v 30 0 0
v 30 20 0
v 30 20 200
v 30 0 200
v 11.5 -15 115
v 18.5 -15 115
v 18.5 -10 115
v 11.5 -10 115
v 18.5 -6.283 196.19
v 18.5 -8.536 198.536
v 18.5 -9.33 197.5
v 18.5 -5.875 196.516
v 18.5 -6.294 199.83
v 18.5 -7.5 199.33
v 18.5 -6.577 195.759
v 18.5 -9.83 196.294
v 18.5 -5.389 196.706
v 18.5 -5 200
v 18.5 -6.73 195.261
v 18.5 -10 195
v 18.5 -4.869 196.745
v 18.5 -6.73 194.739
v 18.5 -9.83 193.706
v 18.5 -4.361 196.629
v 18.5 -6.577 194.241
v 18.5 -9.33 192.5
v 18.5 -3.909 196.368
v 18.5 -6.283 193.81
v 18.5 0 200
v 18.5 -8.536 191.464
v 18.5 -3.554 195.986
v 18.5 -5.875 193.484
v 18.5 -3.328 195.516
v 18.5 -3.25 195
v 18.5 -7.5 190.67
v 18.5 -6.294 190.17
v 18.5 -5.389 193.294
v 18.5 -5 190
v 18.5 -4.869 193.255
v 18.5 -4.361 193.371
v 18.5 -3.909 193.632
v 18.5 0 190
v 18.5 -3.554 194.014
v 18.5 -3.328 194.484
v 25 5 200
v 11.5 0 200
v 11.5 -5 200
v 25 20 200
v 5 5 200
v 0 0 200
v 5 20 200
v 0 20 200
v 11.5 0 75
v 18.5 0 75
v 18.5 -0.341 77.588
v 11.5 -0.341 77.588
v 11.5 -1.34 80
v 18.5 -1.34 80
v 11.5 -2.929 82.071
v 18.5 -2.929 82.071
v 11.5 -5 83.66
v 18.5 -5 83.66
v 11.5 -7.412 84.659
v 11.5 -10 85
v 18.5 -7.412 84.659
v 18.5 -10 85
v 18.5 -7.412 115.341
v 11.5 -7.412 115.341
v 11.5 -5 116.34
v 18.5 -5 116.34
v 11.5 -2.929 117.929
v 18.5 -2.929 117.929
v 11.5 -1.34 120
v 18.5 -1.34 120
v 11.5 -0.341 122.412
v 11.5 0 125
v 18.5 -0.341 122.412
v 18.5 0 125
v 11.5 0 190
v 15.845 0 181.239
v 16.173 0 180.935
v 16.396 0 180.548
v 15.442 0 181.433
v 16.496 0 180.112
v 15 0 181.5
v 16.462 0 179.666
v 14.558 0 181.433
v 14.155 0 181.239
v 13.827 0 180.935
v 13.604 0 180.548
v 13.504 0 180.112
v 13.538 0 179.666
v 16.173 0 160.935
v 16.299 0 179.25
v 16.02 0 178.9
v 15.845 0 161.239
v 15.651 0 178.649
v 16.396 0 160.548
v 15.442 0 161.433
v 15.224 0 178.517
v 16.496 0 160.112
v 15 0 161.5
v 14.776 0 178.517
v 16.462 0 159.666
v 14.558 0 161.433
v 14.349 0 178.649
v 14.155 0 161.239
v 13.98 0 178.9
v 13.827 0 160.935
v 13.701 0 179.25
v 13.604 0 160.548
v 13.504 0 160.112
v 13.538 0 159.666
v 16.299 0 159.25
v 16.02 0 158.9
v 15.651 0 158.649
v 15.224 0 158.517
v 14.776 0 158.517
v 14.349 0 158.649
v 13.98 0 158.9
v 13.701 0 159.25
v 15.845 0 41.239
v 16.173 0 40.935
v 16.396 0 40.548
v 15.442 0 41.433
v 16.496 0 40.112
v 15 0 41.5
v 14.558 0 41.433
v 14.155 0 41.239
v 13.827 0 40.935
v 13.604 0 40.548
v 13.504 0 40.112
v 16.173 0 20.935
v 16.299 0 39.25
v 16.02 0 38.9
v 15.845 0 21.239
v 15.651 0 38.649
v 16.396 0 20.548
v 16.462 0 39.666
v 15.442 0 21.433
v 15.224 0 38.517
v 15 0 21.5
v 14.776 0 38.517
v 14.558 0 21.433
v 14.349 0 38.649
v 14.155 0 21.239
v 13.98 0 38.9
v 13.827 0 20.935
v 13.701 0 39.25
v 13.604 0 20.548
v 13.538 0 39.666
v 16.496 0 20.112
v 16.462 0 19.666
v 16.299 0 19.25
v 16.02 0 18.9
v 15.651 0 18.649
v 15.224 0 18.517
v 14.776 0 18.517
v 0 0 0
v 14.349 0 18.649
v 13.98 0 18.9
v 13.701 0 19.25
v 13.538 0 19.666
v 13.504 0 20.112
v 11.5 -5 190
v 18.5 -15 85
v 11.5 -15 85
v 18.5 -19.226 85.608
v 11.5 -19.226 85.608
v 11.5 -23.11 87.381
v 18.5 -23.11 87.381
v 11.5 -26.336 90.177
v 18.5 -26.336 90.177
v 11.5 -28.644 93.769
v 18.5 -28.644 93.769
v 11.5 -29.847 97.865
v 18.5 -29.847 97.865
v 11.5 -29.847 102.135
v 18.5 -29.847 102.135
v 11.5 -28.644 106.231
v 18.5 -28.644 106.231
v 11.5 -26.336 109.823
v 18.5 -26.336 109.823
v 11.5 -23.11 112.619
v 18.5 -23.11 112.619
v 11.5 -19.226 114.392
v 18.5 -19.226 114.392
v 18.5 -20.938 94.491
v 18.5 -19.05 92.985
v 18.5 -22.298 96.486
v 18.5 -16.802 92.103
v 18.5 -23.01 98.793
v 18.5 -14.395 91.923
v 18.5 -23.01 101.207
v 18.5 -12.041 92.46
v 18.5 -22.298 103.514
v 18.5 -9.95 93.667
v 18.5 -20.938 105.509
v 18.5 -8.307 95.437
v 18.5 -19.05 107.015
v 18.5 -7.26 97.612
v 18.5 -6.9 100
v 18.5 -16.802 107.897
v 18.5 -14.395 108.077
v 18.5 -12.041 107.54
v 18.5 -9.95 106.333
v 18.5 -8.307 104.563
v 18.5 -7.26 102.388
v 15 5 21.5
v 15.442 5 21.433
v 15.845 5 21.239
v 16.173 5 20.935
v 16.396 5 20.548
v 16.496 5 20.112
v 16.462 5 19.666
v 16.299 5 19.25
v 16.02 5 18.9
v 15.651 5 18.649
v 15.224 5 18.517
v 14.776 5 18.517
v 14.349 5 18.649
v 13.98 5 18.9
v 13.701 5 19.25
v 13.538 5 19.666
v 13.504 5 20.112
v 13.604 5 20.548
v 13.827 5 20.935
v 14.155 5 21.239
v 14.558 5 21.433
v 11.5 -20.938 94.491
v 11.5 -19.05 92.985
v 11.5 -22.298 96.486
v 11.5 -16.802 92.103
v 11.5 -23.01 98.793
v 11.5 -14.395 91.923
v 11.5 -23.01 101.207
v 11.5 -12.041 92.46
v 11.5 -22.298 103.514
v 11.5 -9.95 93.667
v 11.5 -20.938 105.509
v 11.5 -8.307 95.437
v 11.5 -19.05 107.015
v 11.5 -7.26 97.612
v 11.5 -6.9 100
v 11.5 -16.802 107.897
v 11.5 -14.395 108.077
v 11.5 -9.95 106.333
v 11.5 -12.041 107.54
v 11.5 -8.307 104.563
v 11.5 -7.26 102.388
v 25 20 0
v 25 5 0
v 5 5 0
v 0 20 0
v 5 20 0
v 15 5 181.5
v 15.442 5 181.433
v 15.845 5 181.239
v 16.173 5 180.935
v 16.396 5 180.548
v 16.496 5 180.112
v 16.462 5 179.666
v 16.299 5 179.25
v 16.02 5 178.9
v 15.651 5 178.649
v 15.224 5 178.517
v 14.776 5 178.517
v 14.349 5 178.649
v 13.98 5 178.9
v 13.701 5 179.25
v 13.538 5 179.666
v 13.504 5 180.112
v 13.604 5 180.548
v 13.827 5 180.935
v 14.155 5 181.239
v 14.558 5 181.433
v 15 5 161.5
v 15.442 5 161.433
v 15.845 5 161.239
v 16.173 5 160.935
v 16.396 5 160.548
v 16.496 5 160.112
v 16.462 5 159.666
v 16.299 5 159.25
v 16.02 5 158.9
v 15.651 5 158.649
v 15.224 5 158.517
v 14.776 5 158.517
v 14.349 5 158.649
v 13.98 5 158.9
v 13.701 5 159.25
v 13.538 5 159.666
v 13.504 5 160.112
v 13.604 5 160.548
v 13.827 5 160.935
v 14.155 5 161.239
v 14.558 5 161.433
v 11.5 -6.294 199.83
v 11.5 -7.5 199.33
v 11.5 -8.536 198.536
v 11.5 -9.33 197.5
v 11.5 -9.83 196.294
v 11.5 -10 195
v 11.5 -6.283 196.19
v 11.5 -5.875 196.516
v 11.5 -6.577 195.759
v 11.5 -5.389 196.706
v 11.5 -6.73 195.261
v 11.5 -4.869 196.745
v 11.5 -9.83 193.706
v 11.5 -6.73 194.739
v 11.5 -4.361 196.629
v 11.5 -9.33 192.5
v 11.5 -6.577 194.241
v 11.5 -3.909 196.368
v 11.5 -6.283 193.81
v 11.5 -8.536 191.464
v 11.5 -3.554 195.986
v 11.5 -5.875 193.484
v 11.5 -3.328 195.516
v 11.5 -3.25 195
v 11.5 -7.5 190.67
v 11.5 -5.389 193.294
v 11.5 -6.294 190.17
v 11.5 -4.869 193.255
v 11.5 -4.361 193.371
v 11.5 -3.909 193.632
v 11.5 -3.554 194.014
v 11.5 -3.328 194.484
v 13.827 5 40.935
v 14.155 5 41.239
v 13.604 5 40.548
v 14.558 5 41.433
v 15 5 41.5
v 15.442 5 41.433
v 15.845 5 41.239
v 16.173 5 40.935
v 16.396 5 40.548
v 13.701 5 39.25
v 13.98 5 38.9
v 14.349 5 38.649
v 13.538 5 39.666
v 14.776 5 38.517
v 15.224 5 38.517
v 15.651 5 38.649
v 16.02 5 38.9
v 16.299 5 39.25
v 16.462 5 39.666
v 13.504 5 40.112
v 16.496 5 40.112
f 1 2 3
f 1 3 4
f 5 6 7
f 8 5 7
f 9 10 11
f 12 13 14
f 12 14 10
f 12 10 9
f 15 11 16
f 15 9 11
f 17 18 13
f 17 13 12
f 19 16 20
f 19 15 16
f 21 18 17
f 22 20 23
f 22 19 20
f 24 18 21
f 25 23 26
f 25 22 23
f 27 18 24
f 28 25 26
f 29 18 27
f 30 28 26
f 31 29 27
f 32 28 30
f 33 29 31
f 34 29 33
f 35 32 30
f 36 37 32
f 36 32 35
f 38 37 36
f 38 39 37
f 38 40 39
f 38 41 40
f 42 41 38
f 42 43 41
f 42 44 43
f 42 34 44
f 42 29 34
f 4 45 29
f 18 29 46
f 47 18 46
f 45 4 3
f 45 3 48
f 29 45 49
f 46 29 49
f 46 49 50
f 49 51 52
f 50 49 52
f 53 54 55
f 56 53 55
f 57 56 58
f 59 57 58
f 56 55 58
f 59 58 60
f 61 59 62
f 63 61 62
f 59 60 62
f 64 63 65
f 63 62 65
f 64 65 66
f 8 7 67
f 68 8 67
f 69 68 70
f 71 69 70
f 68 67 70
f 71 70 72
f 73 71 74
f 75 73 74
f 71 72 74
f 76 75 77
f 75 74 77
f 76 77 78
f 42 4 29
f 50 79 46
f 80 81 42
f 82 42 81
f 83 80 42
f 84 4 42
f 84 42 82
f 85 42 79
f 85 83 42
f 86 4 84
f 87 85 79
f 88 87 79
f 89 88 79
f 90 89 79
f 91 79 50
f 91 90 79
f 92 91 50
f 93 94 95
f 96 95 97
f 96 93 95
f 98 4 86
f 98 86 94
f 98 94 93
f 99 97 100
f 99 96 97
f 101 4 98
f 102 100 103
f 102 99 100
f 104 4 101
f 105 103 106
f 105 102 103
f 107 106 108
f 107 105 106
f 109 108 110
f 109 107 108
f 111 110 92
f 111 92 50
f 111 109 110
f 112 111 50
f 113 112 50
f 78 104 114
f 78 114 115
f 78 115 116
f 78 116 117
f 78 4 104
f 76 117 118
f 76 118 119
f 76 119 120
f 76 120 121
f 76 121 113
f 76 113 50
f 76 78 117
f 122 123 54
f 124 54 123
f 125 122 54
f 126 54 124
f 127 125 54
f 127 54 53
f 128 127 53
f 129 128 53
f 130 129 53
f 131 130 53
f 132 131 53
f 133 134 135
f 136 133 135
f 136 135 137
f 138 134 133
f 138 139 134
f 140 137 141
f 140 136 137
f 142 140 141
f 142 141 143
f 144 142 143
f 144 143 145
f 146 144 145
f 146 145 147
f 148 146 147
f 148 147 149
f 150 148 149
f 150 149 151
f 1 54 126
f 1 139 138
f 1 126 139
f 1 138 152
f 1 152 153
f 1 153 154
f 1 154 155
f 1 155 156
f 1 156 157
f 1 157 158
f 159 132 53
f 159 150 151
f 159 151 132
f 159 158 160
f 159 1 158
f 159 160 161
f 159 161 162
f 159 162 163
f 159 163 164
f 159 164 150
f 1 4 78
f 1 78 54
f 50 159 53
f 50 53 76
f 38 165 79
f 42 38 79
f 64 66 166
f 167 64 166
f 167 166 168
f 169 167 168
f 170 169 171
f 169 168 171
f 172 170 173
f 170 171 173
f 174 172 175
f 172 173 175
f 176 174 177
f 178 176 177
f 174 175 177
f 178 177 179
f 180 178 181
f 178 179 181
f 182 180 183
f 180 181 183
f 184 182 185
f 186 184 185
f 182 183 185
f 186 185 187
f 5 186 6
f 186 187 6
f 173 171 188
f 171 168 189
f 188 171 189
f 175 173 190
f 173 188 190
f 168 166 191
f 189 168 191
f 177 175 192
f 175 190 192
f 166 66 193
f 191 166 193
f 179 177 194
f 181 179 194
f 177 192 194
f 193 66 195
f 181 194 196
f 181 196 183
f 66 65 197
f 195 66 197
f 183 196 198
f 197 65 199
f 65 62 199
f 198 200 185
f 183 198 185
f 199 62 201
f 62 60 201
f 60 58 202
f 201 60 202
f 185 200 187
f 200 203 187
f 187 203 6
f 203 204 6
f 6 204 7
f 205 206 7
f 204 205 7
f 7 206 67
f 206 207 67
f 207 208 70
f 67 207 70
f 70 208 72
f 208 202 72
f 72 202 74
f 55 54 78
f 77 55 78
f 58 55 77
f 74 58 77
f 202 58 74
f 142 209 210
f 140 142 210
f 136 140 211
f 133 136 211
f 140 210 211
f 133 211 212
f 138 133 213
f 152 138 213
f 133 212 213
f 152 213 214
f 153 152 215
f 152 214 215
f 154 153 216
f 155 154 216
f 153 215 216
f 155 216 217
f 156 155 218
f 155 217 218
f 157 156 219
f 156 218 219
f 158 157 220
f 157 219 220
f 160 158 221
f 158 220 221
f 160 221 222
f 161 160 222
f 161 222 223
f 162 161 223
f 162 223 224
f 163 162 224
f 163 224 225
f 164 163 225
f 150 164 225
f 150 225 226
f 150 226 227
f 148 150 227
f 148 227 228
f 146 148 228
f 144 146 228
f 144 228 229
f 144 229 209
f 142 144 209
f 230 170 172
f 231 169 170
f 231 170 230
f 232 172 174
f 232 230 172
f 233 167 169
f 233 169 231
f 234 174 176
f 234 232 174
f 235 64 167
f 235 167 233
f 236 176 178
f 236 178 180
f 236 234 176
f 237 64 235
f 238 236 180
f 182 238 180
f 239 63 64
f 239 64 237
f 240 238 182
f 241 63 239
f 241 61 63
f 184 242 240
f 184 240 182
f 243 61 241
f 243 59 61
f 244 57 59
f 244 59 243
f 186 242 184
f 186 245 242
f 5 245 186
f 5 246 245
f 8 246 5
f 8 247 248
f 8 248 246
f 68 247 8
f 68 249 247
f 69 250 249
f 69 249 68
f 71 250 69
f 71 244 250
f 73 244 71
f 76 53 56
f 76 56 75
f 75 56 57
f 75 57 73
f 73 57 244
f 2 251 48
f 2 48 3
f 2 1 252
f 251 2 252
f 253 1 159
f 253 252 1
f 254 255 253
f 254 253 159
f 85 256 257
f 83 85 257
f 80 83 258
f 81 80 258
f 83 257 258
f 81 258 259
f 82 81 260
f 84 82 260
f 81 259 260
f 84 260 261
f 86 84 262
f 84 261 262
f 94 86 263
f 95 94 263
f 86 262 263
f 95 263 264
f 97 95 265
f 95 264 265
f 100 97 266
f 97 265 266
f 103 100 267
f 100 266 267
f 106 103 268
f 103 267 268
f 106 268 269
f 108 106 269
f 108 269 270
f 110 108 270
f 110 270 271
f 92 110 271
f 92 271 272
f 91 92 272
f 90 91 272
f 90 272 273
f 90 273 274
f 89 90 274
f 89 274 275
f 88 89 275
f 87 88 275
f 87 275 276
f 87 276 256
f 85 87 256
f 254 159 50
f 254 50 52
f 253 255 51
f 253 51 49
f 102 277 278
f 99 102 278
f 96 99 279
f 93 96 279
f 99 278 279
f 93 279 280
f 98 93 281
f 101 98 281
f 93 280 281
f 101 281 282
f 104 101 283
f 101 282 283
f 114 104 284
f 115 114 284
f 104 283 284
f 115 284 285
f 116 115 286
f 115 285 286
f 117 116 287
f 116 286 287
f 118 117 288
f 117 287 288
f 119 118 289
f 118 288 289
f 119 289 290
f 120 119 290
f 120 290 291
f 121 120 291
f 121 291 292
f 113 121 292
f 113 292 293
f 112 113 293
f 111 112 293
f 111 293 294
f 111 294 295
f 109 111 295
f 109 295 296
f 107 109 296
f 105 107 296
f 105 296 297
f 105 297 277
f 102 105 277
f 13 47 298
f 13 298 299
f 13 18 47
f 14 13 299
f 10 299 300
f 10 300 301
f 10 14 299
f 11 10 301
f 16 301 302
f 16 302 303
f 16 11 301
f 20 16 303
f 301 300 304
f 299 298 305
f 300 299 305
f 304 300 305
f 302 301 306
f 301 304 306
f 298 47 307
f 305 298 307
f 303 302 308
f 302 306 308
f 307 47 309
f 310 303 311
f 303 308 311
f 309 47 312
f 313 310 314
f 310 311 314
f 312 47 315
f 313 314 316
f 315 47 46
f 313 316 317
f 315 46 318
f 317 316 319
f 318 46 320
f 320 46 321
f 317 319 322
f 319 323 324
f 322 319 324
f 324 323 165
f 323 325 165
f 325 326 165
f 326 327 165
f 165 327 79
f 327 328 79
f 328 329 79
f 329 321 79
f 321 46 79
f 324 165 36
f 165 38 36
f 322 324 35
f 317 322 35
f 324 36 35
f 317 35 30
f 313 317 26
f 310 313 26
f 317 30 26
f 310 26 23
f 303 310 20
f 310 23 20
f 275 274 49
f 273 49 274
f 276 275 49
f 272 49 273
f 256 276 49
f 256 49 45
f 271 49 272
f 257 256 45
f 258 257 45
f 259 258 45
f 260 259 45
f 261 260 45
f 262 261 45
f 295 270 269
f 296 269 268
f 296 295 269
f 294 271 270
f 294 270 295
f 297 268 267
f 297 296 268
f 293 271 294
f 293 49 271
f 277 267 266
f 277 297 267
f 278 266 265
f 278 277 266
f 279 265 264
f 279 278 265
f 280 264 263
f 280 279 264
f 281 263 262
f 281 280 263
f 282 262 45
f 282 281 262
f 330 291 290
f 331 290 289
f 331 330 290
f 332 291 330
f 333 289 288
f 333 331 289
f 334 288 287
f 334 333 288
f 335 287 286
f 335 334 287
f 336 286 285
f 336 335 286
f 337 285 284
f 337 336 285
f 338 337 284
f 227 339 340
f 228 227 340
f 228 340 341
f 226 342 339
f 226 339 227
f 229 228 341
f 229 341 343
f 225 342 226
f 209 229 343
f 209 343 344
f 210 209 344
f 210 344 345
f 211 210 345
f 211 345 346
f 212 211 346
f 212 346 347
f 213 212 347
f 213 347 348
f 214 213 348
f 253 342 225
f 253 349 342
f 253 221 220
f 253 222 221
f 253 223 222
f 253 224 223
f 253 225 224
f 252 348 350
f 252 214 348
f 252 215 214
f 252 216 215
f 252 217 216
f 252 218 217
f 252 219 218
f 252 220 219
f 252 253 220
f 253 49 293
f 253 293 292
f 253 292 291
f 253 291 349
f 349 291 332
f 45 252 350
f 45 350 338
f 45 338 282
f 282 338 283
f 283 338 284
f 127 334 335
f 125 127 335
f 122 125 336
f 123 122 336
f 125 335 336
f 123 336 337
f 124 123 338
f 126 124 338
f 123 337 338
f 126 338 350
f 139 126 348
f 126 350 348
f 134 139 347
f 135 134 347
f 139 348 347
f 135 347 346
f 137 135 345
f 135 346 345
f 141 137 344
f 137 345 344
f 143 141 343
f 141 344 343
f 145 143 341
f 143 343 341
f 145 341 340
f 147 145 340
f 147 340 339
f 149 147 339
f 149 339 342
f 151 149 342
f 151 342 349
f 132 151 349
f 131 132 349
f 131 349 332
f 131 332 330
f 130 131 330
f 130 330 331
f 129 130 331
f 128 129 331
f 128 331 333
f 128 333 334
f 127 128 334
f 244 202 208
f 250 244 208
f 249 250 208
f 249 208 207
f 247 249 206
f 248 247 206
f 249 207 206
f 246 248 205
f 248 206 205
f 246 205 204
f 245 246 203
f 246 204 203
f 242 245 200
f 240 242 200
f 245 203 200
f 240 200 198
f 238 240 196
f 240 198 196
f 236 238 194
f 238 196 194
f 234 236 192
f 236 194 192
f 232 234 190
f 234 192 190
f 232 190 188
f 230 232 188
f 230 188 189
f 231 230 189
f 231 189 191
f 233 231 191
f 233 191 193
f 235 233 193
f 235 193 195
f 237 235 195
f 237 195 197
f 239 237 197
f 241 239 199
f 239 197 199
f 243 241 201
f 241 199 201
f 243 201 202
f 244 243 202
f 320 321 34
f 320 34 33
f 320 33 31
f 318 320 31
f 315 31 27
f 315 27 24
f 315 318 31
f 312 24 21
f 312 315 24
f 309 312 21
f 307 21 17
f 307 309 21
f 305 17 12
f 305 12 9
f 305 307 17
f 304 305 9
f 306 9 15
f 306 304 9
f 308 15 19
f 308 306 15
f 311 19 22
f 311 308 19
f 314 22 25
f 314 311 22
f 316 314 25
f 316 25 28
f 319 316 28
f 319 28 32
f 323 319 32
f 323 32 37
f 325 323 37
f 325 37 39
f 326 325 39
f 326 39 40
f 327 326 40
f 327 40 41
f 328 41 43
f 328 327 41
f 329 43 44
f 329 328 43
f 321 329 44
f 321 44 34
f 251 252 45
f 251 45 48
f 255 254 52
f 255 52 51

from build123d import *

# Parameters (mm, degrees)
BOSS_EXTRUDE1_DEPTH = 200
BOSS_EXTRUDE2_START = -11.5
SKETCH2_R           = 8.1
BOSS_EXTRUDE2_DEPTH = 7
BOSS_EXTRUDE3_START = -18.5
SKETCH3_W           = 10
SKETCH3_H           = 10
SKETCH3_R           = 1.75
BOSS_EXTRUDE3_DEPTH = 7
FILLET1_R           = 5
SKETCH5_R           = 1.5
CUT_EXTRUDE1_DEPTH  = 7


with BuildPart() as part:
    # Sketch1 → Boss-Extrude1 (new body)
    with BuildSketch(Plane.XY):
        Polygon((25, 20), (30, 20), (30, 0), (0, 0), (0, 20), (5, 20), (5, 5), (25, 5), align=None)
    extrude(amount=BOSS_EXTRUDE1_DEPTH)

    # Sketch2 → Boss-Extrude2 (add)
    with BuildSketch(Plane(origin=(30, 0, 0), x_dir=(0, 0, -1), z_dir=(1, 0, 0)).offset(BOSS_EXTRUDE2_START)):
        with BuildLine():
            Line((-115, -15), (-115, -10))
            ThreePointArc((-115, -10), (-117.928932188, -2.928932188), (-125, 0))
            Line((-125, 0), (-75, 0))
            ThreePointArc((-75, 0), (-82.071067812, -2.928932188), (-85, -10))
            Line((-85, -10), (-85, -15))
            ThreePointArc((-85, -15), (-100, -30), (-115, -15))
        make_face()
        with Locations(Location((-100, -15, 0), (0, 0, 90))):
            Circle(SKETCH2_R, mode=Mode.SUBTRACT)
    extrude(amount=-BOSS_EXTRUDE2_DEPTH)

    # Sketch3 → Boss-Extrude3 (add)
    with BuildSketch(Plane(origin=(30, 0, 0), x_dir=(0, 0, -1), z_dir=(1, 0, 0)).offset(BOSS_EXTRUDE3_START)):
        with Locations((-195, -5)):
            Rectangle(SKETCH3_W, SKETCH3_H)
        with Locations(Location((-195, -5, 0), (0, 0, 90))):
            Circle(SKETCH3_R, mode=Mode.SUBTRACT)
    extrude(amount=BOSS_EXTRUDE3_DEPTH)

    # Fillet1
    fillet1_edges = [part.edges().sort_by_distance(p)[0] for p in [
        (15, -10, 190),
        (15, -10, 200),
    ]]
    fillet(fillet1_edges, radius=FILLET1_R - 0.0001)  # a hair under: the kernel refuses the full size

    # Sketch5 → Cut-Extrude1 (cut)
    with BuildSketch(Plane(origin=(0, 5, 0), x_dir=(1, 0, 0), z_dir=(0, 1, 0))):
        with Locations(Location((15, -180, 0), (0, 0, 270))):
            Circle(SKETCH5_R)
        with Locations(Location((15, -160, 0), (0, 0, 270))):
            Circle(SKETCH5_R)
        with Locations(Location((15, -40, 0), (0, 0, 270))):
            Circle(SKETCH5_R)
        with Locations(Location((15, -20, 0), (0, 0, 270))):
            Circle(SKETCH5_R)
    extrude(amount=-CUT_EXTRUDE1_DEPTH, mode=Mode.SUBTRACT)


solid = part.part
